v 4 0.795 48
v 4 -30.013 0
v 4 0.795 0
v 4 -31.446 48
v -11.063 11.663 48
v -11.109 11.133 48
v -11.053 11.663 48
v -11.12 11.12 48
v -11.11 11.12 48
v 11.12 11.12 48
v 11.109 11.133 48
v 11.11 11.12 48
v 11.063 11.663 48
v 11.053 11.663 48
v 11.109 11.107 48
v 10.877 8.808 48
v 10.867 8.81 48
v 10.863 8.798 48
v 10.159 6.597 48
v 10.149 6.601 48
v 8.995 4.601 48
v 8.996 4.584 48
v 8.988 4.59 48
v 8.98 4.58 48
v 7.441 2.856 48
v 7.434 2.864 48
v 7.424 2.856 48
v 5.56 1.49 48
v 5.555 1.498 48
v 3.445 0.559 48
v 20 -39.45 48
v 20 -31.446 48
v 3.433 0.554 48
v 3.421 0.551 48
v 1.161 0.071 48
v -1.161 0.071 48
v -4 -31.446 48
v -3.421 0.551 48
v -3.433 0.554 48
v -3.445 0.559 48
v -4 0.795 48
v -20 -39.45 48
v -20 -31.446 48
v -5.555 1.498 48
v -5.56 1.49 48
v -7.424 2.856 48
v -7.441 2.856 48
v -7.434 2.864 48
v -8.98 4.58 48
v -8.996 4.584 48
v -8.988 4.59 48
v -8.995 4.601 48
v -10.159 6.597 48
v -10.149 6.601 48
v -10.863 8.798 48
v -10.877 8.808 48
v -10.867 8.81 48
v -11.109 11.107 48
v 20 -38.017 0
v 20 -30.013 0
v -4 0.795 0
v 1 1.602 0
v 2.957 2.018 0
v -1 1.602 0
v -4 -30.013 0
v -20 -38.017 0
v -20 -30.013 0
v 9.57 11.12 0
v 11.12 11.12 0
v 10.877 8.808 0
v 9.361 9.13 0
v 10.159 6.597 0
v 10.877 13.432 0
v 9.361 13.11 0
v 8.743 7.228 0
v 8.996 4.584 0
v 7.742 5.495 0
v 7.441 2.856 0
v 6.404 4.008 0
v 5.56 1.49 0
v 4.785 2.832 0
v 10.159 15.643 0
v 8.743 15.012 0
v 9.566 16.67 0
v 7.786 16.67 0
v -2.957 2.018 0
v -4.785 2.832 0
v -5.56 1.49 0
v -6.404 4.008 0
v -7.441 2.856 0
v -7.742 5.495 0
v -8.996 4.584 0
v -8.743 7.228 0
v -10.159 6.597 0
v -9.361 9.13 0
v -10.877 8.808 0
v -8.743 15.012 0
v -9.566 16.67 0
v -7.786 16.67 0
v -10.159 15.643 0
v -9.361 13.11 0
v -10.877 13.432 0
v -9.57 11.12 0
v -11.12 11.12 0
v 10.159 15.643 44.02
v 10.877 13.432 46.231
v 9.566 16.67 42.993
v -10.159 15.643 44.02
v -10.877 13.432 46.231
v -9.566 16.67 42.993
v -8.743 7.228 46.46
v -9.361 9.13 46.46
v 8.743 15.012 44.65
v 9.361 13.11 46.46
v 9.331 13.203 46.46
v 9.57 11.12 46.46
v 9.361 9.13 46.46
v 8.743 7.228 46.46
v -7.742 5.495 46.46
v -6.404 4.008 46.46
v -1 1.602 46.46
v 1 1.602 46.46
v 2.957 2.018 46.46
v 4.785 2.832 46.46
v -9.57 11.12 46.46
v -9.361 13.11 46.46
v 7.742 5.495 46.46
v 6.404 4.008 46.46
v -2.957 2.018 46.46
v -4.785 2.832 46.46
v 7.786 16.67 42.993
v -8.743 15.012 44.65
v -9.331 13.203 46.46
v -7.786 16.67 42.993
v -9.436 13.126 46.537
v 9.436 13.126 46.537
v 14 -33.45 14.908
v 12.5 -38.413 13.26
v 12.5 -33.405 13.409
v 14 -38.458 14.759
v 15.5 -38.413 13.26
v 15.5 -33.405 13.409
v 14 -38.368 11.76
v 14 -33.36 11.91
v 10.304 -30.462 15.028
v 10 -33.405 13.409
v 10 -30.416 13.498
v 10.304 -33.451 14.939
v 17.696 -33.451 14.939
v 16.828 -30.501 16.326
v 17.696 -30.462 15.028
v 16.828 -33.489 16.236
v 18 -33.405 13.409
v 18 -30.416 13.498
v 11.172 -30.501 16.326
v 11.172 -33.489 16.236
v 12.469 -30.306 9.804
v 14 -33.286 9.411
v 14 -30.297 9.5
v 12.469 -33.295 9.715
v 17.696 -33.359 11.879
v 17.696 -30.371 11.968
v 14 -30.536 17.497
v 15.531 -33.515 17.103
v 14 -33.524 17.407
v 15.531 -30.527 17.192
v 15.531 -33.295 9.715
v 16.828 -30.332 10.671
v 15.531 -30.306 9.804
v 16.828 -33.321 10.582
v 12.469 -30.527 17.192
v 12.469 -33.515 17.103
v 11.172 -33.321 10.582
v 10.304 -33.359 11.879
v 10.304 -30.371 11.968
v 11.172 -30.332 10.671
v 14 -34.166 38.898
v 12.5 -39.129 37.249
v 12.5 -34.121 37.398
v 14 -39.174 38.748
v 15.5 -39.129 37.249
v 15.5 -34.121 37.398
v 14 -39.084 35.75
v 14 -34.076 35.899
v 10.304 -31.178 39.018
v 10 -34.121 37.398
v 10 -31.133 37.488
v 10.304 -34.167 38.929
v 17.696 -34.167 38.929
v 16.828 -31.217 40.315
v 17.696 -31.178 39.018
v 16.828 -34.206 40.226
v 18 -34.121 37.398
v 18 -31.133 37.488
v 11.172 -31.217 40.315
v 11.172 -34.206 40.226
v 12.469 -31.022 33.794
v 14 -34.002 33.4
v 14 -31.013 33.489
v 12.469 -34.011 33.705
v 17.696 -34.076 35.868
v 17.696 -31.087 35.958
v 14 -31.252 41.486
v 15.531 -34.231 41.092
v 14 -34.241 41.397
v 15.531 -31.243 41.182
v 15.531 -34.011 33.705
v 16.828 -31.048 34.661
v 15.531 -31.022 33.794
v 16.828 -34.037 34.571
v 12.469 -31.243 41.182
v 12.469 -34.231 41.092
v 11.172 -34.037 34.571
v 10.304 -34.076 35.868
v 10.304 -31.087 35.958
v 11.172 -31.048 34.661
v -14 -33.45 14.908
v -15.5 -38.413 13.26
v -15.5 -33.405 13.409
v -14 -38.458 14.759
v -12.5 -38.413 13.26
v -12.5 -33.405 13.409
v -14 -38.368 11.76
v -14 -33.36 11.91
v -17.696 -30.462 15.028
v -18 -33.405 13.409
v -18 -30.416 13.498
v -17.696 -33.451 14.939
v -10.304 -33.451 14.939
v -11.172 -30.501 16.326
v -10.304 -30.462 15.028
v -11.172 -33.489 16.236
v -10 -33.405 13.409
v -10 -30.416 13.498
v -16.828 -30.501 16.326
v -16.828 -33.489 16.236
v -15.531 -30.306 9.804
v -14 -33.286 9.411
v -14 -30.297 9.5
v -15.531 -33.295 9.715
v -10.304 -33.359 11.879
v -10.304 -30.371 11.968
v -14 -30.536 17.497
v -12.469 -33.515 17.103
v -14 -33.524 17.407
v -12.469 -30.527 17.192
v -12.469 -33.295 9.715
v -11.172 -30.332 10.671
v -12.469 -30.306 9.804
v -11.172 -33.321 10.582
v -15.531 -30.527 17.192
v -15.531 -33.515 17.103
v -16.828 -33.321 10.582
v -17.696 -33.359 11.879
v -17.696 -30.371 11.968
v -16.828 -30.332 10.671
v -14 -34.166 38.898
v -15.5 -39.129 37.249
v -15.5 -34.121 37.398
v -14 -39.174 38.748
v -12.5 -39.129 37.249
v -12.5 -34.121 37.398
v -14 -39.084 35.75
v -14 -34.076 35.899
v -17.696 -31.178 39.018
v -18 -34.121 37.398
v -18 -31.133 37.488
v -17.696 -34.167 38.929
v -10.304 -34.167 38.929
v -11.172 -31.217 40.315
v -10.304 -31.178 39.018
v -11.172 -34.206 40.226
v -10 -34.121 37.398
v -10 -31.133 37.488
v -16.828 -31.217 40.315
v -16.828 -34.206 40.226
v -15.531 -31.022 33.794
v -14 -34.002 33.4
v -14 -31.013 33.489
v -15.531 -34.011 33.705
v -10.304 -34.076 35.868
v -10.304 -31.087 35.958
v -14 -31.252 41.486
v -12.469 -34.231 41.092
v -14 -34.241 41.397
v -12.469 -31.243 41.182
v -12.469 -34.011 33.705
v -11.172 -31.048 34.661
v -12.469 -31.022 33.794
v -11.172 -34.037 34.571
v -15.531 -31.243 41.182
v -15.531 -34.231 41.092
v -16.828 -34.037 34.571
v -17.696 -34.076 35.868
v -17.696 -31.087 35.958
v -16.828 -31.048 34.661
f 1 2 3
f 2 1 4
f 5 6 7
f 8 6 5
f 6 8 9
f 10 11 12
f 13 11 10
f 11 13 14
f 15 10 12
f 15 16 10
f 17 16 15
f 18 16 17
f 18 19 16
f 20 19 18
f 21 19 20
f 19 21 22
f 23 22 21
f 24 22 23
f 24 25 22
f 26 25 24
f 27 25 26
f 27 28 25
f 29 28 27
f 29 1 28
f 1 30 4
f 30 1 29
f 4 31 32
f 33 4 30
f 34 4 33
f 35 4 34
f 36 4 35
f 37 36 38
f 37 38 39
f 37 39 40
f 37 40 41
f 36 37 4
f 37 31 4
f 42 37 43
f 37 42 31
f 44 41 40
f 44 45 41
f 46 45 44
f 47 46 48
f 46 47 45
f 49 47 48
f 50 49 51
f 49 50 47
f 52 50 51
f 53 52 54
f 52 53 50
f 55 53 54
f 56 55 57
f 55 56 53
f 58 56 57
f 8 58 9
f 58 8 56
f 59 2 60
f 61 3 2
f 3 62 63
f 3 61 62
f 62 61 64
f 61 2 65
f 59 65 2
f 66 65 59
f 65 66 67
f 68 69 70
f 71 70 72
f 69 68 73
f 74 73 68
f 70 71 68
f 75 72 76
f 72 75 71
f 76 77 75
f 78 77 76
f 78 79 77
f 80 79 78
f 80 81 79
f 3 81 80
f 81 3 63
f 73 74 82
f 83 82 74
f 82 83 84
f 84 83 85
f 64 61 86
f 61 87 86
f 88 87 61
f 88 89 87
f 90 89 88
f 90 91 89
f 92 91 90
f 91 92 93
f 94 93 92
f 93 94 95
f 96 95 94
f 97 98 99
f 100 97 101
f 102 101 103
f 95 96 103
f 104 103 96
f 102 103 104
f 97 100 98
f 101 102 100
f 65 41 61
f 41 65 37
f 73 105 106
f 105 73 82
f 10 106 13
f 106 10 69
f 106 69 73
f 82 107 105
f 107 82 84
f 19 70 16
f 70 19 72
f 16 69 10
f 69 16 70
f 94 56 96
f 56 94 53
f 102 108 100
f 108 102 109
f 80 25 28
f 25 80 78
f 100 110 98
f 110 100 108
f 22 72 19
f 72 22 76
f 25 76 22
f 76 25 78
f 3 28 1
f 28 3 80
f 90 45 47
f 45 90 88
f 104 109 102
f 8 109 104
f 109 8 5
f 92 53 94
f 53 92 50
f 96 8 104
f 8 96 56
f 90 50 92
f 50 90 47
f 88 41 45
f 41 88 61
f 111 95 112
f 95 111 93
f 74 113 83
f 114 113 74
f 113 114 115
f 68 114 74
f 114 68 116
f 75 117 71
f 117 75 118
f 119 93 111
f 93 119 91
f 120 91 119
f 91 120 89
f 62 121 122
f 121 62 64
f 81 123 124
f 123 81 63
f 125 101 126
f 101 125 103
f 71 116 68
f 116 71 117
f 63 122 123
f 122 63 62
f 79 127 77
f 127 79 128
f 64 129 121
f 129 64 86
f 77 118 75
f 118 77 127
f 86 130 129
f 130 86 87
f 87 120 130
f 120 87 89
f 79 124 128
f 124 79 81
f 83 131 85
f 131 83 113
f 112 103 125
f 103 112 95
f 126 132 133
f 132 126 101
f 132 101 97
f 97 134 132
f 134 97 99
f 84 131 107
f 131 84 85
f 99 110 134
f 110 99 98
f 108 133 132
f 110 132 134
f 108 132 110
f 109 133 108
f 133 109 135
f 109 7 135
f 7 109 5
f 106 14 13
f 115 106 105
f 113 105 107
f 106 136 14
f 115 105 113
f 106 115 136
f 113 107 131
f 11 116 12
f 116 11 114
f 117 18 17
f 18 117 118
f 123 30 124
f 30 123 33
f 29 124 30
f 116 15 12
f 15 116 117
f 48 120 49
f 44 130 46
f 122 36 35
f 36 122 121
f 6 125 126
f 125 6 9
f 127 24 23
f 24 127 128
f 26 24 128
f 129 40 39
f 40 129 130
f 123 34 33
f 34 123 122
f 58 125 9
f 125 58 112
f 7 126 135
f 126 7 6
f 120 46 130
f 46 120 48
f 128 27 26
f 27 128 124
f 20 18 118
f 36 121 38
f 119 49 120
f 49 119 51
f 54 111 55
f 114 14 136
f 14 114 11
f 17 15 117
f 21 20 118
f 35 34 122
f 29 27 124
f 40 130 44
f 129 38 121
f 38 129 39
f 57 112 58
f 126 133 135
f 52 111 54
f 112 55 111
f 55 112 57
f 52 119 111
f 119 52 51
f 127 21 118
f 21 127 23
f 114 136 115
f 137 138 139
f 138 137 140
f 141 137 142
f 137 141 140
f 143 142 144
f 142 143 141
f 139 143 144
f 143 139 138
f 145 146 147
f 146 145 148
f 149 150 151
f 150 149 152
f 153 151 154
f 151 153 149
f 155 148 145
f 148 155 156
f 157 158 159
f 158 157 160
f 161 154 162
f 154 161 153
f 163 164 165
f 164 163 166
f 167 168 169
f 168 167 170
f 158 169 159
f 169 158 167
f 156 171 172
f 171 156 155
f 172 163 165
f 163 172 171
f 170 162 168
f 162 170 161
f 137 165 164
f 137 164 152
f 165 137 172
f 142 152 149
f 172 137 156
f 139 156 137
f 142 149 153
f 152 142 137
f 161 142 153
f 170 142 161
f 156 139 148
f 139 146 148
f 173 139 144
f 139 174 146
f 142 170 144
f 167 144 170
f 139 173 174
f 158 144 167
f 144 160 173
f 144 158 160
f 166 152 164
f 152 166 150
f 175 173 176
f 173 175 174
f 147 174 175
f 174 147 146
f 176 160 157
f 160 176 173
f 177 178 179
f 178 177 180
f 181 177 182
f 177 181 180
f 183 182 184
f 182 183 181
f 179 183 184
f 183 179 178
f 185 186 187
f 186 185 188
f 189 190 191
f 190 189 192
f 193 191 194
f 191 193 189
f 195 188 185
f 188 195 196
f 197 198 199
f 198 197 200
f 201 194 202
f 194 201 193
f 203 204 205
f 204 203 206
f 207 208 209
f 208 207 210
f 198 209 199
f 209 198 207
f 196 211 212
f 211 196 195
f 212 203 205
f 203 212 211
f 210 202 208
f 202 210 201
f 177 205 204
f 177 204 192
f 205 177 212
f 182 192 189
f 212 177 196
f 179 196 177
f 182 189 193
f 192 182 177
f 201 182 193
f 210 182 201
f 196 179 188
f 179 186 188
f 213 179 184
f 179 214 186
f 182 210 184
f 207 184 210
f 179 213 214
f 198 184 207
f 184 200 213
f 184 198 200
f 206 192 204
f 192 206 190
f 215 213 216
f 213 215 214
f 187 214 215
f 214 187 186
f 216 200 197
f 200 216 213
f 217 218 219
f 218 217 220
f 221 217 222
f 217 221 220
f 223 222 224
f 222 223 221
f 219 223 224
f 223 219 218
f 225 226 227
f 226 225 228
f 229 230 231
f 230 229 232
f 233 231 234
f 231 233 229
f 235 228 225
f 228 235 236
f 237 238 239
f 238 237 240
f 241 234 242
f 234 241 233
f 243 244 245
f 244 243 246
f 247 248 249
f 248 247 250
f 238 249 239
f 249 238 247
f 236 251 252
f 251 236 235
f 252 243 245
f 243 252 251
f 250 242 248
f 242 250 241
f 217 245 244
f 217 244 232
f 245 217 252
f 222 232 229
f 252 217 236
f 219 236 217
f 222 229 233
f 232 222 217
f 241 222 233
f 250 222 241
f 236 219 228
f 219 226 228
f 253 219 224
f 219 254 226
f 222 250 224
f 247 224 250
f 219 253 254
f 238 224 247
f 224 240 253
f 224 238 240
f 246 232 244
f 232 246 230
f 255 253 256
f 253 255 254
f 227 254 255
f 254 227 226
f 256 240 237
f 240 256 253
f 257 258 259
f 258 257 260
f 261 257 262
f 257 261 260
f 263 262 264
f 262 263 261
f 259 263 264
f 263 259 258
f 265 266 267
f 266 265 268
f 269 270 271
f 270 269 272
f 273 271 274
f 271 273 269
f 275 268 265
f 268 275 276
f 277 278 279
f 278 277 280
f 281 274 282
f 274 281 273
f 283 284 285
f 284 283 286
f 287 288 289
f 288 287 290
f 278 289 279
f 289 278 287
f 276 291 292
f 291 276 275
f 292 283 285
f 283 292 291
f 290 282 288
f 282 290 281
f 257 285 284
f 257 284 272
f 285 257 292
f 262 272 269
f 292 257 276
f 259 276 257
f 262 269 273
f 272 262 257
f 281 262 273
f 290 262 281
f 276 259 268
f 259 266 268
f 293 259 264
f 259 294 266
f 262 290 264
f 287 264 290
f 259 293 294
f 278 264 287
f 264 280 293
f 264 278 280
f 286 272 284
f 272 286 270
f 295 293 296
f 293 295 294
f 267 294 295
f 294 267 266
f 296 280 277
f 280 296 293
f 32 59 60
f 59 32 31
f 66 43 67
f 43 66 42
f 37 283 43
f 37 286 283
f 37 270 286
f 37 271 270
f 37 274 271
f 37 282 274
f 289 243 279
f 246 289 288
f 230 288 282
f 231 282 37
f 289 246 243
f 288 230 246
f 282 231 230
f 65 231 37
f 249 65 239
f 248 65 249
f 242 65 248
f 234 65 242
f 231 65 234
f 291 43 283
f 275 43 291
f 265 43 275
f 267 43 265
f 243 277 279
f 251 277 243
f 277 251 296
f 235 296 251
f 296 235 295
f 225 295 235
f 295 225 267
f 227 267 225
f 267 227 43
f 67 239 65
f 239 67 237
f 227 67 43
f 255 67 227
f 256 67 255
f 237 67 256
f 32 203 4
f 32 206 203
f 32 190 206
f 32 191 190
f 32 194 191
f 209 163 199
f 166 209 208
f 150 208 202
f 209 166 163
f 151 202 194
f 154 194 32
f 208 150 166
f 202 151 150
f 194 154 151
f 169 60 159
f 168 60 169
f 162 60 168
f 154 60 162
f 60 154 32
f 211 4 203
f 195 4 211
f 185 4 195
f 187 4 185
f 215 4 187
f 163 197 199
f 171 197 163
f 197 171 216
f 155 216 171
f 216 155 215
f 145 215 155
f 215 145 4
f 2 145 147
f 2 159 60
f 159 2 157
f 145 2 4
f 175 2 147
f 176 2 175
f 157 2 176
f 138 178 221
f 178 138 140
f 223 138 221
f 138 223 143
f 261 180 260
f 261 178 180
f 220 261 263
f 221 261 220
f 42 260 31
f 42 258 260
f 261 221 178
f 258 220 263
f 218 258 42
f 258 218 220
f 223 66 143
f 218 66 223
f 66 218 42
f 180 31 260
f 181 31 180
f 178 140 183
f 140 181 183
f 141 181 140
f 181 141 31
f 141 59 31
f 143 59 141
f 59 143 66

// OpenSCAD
clipAngle = 1.71;
clipLength = 48; 
poleDiameter = 19.14;

webThickness = 1.55;
clipBottomStickout = 30;
clipAttachmentThickness = 8;

screwHoleSize = 3;
screwHoleCountersinkDiameter = 8;
screwHoleCountersinkDepth = 3;

flangeWidth = 40;
flangeThickness = 8;

bottomScrewsHeightFactor = 0.3; // this is weirdly dependent on the angle -- just experiment 
topScrewsHeightFactor = 0.8; // this is weirdly dependent on the angle -- just experiment

nudge = 0.01;

module clip() {
    render(convexity=5)
    translate([0,poleDiameter/2+webThickness,])
    difference() {
        union() {
            translate([-clipAttachmentThickness/2,-clipBottomStickout-poleDiameter/2,0])
            cube([clipAttachmentThickness,clipBottomStickout,clipLength]);
                cylinder(h=clipLength,d=poleDiameter+2*webThickness);
        }
        translate([0,poleDiameter*.85,clipLength]) rotate([-45,0,0])
        cube(center=true,poleDiameter+2*webThickness);
translate([0,0,clipLength-webThickness+nudge]) cylinder(h=webThickness,d1=poleDiameter,d2=poleDiameter+2*webThickness);
        translate([0,0,-nudge]) {
            cylinder(h=clipLength+2*nudge,d=poleDiameter);
            translate([0,1.5*(webThickness+poleDiameter/2),0]) linear_extrude(height=clipLength+2*nudge) square(center=true, poleDiameter+2*webThickness+2*nudge);
        }
    }
}

module screwHole() {
rotate([90,0,0])
translate([0,0,-nudge]) {
    cylinder(d=screwHoleSize, $fn=4, h=flangeThickness+2*nudge); 
    cylinder(d=screwHoleCountersinkDiameter, $fn=16, h=screwHoleCountersinkDepth);
    }
}

module wallAttachment() {
    render(convexity=2)
    intersection() {
    translate([-250,-250,0]) cube([500,500,clipLength]);
    rotate([clipAngle,0,0])
    {
    translate([0,-clipBottomStickout-flangeThickness,0]) difference() {
    translate([-flangeWidth/2,0,-clipLength])
        cube([flangeWidth, flangeThickness, 3*clipLength]);
        translate([flangeWidth*.35,clipAttachmentThickness,clipLength*bottomScrewsHeightFactor]) screwHole();
        translate([flangeWidth*.35,clipAttachmentThickness,clipLength*topScrewsHeightFactor]) screwHole();
        translate([-flangeWidth*.35,clipAttachmentThickness,clipLength*bottomScrewsHeightFactor]) screwHole();
        translate([-flangeWidth*.35,clipAttachmentThickness,clipLength*topScrewsHeightFactor]) screwHole();
    }
    translate([-flangeWidth/2,0,-clipLength])
        translate([flangeWidth/2-clipAttachmentThickness/2,-clipBottomStickout,0])
        cube([clipAttachmentThickness,clipBottomStickout,3*clipLength]);
    }
    }
}

clip();
wallAttachment();
